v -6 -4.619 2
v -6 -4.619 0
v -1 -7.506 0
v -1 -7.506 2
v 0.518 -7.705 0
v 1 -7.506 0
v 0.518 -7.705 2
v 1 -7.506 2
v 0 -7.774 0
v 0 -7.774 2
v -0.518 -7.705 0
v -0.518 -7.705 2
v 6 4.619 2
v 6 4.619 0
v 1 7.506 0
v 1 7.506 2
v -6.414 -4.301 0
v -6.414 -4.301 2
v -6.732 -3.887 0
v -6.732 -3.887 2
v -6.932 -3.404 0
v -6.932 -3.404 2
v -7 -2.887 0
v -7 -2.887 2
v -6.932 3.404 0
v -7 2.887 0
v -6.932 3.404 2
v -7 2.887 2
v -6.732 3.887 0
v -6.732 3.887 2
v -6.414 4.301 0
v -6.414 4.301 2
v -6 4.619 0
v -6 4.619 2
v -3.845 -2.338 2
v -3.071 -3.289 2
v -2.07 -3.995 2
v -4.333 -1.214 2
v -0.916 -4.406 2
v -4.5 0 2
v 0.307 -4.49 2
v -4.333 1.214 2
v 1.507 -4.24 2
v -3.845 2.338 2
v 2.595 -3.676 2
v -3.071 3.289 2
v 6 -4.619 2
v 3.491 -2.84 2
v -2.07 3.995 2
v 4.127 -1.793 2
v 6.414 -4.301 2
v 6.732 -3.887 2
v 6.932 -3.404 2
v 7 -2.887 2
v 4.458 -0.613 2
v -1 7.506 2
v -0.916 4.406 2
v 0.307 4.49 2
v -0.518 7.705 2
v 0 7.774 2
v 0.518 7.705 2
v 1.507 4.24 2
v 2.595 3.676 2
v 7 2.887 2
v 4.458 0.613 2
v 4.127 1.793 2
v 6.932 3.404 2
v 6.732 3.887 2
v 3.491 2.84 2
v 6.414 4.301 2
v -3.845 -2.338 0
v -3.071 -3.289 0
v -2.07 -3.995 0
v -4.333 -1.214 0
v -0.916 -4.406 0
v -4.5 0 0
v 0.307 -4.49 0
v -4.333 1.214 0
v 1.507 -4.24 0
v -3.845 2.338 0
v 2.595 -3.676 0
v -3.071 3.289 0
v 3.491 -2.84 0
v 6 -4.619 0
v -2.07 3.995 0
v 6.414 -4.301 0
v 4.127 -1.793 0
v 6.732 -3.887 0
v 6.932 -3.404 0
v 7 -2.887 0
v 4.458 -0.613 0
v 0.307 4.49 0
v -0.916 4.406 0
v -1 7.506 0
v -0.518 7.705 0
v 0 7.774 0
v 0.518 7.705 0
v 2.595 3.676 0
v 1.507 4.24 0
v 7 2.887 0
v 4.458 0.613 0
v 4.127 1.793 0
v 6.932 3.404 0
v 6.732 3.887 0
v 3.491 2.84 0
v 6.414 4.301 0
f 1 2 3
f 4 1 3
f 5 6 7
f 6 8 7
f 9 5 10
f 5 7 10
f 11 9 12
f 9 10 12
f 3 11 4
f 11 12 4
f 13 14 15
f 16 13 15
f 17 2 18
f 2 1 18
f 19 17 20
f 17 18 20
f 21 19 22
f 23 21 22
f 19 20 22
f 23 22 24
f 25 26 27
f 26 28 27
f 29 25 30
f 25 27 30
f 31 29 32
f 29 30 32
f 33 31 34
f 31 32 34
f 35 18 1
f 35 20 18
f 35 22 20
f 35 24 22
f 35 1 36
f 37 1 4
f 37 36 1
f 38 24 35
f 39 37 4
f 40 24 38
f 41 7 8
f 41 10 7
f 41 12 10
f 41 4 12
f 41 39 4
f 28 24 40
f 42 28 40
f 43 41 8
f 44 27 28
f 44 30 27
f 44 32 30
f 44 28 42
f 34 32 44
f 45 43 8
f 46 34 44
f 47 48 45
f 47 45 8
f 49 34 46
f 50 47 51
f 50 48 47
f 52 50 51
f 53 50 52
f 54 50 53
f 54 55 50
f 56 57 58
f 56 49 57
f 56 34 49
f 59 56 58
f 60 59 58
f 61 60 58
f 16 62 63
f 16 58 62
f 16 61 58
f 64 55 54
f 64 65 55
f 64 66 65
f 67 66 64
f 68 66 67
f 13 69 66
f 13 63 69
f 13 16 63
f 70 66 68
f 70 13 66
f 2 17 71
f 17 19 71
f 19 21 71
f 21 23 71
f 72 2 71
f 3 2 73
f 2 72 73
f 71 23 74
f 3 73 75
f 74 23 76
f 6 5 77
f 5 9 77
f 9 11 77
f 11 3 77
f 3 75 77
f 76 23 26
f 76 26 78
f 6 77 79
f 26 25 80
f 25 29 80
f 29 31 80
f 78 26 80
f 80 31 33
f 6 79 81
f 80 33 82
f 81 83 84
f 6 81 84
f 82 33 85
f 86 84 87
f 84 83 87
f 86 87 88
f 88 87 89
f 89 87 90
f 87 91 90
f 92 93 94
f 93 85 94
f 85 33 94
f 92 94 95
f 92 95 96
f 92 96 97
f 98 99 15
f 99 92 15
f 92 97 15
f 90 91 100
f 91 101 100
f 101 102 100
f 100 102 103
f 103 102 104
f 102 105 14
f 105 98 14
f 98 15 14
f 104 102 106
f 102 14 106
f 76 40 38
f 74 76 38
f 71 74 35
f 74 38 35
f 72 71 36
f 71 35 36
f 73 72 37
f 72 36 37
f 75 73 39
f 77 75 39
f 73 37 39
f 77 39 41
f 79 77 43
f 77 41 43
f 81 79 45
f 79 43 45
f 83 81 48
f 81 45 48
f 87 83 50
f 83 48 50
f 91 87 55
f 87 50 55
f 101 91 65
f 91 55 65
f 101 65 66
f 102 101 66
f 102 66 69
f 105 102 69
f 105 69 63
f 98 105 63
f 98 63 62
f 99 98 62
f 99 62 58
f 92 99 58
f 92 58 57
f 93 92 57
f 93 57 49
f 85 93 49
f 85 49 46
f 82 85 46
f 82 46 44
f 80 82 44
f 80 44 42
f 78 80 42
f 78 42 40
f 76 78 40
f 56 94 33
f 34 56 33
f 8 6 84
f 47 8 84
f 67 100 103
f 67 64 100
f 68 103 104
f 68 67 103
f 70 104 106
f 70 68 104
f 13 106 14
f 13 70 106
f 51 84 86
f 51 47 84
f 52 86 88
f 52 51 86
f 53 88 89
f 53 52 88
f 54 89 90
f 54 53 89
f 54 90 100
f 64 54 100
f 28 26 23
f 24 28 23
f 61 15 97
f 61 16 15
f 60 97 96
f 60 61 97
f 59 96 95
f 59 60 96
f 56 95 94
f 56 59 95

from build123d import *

# Parameters (mm, degrees)
F0_R     = 5
F1_DEPTH = 2
F2_D     = 9
F3_R     = 2


with BuildPart() as f1:
    # F0 (on Top) → F1 (new body)
    with BuildSketch(Plane.XY):
        Polygon((0, -8.0829037687), (7, -4.0414518843), (7, 4.0414518843), (0, 8.0829037687), (-7, 4.0414518843), (-7, -4.0414518843), align=None)
        Circle(F0_R, mode=Mode.SUBTRACT)
        Circle(F0_R)
    extrude(amount=F1_DEPTH)

    # F2 (through all)
    with Locations(Plane(origin=(0, 0, 0), x_dir=(1, 0, 0), z_dir=(0, 0, -1))):
        with Locations((0, 0)):
            Hole(F2_D / 2)

    # F3
    f3_edges = [f1.edges().sort_by_distance(p)[0] for p in [
        (0, -8.082904, 1),
        (7, -4.041452, 1),
        (7, 4.041452, 1),
        (0, 8.082904, 1),
        (-7, 4.041452, 1),
        (-7, -4.041452, 1),
    ]]
    fillet(f3_edges, radius=F3_R)


solid = f1.part
